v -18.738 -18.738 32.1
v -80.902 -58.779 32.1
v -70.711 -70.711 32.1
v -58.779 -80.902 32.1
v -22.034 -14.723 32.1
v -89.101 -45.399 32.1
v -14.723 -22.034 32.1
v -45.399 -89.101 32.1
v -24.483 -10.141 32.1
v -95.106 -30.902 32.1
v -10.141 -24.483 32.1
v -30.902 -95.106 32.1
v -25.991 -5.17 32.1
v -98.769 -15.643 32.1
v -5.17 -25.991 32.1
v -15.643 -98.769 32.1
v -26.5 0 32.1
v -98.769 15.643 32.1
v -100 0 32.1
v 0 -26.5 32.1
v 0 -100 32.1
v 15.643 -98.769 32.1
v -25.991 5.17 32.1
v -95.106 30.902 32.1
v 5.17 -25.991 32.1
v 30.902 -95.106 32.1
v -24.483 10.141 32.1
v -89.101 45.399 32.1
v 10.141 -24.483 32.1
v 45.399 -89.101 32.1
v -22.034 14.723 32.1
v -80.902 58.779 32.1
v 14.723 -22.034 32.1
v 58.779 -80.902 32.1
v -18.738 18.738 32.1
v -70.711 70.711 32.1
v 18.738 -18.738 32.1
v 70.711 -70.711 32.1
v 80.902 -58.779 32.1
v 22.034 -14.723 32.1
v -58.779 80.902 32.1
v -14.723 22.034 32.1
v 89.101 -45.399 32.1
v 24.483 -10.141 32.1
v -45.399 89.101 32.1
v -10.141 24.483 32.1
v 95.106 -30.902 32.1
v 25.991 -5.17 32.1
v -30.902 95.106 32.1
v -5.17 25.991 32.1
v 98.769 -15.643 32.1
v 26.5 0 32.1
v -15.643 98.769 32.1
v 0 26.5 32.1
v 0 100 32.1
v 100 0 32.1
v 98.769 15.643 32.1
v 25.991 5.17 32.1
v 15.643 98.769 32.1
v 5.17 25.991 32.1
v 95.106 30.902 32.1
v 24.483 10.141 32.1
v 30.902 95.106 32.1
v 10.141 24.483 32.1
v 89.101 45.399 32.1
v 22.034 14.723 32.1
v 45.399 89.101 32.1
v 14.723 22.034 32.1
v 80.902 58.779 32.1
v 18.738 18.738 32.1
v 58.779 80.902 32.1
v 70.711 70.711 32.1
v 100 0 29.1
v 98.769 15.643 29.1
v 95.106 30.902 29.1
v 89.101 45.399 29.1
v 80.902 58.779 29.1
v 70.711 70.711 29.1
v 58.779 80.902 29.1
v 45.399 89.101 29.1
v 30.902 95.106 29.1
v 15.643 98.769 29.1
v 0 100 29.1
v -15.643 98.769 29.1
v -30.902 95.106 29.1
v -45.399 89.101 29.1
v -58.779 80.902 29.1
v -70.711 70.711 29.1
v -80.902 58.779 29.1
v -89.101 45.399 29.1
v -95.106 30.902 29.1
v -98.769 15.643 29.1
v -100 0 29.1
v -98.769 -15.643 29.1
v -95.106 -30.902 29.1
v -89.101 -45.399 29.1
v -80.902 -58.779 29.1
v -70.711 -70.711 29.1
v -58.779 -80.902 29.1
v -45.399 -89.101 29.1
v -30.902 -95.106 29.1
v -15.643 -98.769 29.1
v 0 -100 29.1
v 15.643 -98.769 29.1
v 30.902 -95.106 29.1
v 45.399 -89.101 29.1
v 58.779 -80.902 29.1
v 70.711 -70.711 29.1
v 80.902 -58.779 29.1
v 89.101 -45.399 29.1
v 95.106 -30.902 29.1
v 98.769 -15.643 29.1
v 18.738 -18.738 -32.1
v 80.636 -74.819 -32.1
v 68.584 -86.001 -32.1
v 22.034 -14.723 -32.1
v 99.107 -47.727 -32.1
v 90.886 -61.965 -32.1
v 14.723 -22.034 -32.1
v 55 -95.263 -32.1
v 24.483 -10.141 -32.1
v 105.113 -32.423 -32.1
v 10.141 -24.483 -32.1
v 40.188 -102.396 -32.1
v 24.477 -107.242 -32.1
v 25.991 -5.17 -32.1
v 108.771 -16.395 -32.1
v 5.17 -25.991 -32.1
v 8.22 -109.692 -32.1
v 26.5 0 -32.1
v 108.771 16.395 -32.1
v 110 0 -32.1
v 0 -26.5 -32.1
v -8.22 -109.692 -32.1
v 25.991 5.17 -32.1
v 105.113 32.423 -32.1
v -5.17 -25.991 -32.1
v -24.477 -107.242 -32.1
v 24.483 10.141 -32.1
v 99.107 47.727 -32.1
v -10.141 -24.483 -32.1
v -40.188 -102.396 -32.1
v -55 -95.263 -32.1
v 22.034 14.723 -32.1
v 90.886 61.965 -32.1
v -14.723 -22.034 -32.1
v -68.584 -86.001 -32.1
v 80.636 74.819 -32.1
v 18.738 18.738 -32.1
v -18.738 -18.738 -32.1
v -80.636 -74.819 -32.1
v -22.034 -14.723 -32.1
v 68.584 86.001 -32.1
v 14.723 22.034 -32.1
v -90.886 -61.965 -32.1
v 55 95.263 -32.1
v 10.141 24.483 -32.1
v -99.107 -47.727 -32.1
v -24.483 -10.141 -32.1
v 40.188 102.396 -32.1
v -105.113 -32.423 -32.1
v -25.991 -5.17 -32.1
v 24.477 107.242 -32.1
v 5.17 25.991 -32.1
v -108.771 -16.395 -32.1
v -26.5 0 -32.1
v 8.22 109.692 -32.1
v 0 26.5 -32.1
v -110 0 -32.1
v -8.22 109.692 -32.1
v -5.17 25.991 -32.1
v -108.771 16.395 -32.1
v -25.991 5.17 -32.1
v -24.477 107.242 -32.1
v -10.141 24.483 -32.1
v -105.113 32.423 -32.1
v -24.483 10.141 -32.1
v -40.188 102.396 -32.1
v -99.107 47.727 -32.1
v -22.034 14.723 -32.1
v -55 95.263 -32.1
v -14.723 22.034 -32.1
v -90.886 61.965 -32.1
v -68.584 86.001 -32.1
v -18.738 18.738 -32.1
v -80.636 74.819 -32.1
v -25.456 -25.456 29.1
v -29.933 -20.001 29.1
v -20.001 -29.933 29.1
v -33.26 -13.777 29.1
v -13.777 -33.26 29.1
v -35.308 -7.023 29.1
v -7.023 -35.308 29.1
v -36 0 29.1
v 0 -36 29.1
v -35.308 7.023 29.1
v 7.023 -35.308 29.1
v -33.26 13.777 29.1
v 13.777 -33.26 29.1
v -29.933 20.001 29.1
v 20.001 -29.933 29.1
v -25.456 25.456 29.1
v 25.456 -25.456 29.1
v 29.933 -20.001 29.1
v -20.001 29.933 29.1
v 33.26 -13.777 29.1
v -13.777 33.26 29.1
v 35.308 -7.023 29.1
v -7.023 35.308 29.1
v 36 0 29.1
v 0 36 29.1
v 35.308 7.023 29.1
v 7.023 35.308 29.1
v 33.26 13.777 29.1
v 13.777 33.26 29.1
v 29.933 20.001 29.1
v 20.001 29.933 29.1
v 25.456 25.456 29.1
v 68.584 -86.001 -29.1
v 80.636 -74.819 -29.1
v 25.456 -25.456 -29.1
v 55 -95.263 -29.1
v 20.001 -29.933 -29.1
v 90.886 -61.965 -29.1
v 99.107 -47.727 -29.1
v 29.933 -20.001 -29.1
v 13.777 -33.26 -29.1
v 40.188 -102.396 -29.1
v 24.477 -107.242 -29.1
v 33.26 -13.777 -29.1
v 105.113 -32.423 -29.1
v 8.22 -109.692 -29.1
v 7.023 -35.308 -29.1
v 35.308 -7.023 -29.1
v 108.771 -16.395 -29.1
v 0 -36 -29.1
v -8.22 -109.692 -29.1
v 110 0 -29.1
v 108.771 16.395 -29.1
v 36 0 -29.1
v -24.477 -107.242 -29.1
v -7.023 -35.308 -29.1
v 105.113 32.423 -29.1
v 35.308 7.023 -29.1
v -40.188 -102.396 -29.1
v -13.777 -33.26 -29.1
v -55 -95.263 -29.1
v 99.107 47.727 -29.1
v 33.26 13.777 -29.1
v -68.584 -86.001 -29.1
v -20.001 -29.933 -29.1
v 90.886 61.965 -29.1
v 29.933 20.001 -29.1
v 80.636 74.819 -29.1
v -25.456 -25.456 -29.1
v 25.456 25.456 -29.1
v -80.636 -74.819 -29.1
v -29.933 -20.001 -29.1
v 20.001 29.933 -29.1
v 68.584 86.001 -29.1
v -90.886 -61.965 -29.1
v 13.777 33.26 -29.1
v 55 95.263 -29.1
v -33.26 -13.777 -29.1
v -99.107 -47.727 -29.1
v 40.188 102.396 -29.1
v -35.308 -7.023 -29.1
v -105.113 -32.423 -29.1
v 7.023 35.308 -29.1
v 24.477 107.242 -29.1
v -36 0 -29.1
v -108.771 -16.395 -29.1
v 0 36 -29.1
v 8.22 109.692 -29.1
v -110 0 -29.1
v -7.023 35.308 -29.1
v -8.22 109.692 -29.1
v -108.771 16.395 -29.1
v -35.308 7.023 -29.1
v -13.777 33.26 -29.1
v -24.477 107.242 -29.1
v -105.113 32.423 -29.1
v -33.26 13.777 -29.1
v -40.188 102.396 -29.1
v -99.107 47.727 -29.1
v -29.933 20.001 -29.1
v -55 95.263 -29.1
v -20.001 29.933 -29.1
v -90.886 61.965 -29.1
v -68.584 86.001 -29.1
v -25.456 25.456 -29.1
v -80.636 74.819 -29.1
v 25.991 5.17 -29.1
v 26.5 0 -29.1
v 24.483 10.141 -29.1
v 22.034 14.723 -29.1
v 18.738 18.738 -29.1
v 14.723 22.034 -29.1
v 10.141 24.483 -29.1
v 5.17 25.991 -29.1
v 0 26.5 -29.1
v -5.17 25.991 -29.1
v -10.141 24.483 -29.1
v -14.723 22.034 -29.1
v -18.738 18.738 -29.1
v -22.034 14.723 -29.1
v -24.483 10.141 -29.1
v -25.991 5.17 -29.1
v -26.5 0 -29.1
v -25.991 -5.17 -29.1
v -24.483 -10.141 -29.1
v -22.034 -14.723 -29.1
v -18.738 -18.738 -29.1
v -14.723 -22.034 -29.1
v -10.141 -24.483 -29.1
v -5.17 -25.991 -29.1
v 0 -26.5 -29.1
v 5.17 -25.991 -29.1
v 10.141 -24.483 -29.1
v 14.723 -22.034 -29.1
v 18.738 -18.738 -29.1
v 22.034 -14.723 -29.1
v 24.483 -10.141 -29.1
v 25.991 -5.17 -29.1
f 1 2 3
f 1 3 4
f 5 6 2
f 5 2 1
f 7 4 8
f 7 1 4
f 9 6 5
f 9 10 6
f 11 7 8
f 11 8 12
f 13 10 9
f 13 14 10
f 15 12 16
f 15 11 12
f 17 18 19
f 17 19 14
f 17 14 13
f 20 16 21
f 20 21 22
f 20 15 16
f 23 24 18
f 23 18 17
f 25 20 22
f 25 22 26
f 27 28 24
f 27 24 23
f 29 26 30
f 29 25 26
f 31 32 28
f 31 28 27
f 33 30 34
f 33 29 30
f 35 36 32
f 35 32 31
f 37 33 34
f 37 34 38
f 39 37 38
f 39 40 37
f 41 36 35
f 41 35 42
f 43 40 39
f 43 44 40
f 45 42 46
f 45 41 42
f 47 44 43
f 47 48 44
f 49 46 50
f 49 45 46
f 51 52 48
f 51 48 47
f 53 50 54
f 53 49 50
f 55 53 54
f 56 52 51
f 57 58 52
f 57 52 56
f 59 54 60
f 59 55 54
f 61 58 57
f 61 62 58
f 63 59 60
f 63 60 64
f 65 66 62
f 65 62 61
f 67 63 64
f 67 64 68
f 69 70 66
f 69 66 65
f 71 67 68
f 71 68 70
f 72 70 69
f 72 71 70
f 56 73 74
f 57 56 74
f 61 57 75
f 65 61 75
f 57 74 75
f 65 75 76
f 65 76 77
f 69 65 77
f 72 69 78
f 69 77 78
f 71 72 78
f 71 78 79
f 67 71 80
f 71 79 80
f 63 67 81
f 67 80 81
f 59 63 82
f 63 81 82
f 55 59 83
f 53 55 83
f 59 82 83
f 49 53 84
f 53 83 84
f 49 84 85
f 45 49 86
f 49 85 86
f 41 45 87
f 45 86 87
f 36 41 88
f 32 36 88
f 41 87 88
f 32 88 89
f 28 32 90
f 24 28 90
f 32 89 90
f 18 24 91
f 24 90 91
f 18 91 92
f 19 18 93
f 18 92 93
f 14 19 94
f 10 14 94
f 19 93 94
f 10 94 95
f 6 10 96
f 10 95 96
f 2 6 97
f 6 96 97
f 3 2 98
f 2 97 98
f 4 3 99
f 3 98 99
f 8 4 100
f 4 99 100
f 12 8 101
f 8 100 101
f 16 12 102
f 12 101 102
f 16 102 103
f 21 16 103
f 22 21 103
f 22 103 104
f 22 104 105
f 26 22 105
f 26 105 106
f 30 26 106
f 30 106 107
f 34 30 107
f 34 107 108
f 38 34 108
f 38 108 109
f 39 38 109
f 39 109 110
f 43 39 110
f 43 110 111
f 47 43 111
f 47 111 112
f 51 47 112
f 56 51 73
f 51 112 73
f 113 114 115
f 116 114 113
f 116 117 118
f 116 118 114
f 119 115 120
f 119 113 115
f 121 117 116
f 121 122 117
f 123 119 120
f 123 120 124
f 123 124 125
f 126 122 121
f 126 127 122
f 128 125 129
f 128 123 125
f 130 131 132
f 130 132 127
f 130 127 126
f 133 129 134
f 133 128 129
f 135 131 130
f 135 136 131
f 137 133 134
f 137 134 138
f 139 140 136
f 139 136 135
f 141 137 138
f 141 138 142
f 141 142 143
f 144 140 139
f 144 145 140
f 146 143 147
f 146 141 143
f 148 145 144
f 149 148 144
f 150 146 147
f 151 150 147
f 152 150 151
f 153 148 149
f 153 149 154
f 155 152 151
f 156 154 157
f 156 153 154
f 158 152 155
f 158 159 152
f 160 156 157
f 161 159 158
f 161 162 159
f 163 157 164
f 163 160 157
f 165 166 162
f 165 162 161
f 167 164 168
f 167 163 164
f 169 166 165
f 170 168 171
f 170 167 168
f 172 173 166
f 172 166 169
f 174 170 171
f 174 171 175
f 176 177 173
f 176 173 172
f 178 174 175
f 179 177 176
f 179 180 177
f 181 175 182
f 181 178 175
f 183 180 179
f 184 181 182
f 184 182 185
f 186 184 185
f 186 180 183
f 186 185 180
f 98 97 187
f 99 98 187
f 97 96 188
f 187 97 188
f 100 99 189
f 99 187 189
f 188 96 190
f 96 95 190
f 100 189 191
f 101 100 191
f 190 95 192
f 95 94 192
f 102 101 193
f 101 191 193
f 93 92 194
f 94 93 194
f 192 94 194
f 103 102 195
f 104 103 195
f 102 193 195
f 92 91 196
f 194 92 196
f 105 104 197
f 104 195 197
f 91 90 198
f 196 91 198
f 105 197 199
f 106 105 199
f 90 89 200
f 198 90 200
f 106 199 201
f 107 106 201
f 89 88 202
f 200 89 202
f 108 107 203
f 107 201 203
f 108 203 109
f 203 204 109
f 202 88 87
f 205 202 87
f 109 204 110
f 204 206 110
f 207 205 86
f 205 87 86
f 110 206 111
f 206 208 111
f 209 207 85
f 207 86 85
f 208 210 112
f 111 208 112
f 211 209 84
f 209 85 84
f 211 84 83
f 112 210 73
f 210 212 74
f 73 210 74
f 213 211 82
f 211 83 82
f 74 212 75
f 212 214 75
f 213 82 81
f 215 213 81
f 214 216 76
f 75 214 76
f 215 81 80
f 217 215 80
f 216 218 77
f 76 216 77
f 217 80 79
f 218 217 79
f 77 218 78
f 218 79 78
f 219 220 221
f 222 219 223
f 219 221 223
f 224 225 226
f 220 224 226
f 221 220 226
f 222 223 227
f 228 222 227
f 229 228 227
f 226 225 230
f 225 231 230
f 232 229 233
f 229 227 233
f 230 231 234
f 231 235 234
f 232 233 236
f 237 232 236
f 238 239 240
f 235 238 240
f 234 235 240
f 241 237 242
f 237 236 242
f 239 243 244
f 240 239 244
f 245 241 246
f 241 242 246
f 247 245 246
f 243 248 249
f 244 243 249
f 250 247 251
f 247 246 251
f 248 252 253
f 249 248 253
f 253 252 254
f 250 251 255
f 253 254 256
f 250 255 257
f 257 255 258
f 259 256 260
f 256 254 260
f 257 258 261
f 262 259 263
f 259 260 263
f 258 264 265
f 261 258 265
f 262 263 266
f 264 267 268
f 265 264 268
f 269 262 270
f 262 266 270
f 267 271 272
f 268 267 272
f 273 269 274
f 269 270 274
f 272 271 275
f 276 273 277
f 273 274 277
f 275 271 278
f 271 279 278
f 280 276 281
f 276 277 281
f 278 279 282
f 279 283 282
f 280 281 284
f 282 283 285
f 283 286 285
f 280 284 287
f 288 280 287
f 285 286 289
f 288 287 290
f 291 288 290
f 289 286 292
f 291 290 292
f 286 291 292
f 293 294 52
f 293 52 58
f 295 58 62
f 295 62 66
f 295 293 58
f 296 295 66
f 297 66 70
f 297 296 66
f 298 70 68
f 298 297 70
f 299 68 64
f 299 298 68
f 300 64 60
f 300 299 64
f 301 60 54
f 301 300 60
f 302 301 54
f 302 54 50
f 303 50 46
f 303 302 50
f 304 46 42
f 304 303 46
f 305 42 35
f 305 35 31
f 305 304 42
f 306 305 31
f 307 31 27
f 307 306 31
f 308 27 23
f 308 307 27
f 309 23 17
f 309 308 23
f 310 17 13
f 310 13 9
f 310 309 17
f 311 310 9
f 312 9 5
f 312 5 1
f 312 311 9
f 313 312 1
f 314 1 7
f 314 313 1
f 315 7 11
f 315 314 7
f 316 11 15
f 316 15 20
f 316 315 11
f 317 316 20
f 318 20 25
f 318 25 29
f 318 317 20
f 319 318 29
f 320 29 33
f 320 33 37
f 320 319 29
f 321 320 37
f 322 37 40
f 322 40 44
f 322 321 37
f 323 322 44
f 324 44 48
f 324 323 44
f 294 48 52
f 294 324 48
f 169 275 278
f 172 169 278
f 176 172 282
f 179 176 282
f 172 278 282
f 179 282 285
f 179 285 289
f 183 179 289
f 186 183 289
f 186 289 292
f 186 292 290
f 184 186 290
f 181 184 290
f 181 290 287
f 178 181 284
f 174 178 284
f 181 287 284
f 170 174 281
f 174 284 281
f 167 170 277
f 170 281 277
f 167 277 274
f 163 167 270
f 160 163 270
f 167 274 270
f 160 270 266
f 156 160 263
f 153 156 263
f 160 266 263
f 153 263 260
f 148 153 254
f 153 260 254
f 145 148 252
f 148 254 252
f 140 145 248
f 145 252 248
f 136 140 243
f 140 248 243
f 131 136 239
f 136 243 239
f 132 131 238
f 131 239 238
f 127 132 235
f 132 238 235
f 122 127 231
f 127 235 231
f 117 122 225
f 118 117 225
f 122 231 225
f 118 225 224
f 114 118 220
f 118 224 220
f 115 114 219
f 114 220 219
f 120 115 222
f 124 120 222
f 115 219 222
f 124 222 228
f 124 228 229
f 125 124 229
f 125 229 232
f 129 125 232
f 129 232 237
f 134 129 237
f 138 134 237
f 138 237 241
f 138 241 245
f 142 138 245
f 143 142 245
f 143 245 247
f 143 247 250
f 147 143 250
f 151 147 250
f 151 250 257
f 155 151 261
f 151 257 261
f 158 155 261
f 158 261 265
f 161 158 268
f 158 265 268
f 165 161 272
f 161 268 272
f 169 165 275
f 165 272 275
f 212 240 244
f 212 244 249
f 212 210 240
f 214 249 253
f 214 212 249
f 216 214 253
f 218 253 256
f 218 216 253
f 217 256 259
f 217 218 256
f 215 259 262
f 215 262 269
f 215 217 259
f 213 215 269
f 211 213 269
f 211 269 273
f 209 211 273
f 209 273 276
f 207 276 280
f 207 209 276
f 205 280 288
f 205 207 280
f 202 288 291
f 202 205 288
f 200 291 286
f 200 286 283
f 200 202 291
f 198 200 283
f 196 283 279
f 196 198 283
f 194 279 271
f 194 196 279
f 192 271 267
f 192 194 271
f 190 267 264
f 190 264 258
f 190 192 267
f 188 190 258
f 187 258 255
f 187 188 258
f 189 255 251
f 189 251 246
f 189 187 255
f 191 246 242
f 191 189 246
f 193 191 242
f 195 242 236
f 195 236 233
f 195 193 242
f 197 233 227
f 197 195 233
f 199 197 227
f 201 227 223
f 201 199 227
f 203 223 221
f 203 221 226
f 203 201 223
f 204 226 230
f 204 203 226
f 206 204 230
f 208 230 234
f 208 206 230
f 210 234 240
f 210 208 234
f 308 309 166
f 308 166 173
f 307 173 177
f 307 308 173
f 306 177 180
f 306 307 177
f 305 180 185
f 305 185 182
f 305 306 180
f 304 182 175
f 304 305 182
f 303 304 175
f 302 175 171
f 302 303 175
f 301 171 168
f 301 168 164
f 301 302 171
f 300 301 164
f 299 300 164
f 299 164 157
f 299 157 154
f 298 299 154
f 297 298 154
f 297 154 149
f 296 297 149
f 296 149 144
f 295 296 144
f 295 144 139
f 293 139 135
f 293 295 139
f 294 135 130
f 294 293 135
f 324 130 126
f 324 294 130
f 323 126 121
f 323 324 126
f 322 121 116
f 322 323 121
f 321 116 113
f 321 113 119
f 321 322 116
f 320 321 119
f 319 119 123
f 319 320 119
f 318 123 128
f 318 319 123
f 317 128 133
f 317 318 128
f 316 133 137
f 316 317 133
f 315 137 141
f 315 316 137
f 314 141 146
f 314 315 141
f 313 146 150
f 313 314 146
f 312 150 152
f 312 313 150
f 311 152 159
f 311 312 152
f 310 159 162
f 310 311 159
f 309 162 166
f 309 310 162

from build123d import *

# Parameters (mm, degrees)
EXTRUDE1_DEPTH      = 29.1
EXTRUDE1_DEPTH_BACK = 29.1
SKETCH1_R           = 36
SKETCH1_R_2         = 26.5
SKETCH2_R           = 100
SKETCH2_R_2         = 26.5
EXTRUDE4_DEPTH      = 3
EXTRUDE5_START      = 3
SKETCH4_R           = 110
SKETCH4_R_2         = 26.5
EXTRUDE5_DEPTH      = 3


with BuildPart() as part:
    # Sketch1 → Extrude1 (new, two sides: drawn at the far end of the back side and taken through both)
    with BuildSketch(Plane.XY.offset(-EXTRUDE1_DEPTH_BACK)):
        Circle(SKETCH1_R)
        Circle(SKETCH1_R_2, mode=Mode.SUBTRACT)
    extrude(amount=EXTRUDE1_DEPTH + EXTRUDE1_DEPTH_BACK)

    # Sketch2 → Extrude4 (add)
    with BuildSketch(Plane.XY.offset(29.1)):
        Circle(SKETCH2_R)
        Circle(SKETCH2_R_2, mode=Mode.SUBTRACT)
    extrude(amount=EXTRUDE4_DEPTH)

    # Sketch4 → Extrude5 (add)
    with BuildSketch(Plane(origin=(0, 0, -29.1), x_dir=(-1, 0, 0), z_dir=(0, 0, -1)).offset(EXTRUDE5_START)):
        Circle(SKETCH4_R)
        Circle(SKETCH4_R_2, mode=Mode.SUBTRACT)
    extrude(amount=-EXTRUDE5_DEPTH)


solid = part.part
